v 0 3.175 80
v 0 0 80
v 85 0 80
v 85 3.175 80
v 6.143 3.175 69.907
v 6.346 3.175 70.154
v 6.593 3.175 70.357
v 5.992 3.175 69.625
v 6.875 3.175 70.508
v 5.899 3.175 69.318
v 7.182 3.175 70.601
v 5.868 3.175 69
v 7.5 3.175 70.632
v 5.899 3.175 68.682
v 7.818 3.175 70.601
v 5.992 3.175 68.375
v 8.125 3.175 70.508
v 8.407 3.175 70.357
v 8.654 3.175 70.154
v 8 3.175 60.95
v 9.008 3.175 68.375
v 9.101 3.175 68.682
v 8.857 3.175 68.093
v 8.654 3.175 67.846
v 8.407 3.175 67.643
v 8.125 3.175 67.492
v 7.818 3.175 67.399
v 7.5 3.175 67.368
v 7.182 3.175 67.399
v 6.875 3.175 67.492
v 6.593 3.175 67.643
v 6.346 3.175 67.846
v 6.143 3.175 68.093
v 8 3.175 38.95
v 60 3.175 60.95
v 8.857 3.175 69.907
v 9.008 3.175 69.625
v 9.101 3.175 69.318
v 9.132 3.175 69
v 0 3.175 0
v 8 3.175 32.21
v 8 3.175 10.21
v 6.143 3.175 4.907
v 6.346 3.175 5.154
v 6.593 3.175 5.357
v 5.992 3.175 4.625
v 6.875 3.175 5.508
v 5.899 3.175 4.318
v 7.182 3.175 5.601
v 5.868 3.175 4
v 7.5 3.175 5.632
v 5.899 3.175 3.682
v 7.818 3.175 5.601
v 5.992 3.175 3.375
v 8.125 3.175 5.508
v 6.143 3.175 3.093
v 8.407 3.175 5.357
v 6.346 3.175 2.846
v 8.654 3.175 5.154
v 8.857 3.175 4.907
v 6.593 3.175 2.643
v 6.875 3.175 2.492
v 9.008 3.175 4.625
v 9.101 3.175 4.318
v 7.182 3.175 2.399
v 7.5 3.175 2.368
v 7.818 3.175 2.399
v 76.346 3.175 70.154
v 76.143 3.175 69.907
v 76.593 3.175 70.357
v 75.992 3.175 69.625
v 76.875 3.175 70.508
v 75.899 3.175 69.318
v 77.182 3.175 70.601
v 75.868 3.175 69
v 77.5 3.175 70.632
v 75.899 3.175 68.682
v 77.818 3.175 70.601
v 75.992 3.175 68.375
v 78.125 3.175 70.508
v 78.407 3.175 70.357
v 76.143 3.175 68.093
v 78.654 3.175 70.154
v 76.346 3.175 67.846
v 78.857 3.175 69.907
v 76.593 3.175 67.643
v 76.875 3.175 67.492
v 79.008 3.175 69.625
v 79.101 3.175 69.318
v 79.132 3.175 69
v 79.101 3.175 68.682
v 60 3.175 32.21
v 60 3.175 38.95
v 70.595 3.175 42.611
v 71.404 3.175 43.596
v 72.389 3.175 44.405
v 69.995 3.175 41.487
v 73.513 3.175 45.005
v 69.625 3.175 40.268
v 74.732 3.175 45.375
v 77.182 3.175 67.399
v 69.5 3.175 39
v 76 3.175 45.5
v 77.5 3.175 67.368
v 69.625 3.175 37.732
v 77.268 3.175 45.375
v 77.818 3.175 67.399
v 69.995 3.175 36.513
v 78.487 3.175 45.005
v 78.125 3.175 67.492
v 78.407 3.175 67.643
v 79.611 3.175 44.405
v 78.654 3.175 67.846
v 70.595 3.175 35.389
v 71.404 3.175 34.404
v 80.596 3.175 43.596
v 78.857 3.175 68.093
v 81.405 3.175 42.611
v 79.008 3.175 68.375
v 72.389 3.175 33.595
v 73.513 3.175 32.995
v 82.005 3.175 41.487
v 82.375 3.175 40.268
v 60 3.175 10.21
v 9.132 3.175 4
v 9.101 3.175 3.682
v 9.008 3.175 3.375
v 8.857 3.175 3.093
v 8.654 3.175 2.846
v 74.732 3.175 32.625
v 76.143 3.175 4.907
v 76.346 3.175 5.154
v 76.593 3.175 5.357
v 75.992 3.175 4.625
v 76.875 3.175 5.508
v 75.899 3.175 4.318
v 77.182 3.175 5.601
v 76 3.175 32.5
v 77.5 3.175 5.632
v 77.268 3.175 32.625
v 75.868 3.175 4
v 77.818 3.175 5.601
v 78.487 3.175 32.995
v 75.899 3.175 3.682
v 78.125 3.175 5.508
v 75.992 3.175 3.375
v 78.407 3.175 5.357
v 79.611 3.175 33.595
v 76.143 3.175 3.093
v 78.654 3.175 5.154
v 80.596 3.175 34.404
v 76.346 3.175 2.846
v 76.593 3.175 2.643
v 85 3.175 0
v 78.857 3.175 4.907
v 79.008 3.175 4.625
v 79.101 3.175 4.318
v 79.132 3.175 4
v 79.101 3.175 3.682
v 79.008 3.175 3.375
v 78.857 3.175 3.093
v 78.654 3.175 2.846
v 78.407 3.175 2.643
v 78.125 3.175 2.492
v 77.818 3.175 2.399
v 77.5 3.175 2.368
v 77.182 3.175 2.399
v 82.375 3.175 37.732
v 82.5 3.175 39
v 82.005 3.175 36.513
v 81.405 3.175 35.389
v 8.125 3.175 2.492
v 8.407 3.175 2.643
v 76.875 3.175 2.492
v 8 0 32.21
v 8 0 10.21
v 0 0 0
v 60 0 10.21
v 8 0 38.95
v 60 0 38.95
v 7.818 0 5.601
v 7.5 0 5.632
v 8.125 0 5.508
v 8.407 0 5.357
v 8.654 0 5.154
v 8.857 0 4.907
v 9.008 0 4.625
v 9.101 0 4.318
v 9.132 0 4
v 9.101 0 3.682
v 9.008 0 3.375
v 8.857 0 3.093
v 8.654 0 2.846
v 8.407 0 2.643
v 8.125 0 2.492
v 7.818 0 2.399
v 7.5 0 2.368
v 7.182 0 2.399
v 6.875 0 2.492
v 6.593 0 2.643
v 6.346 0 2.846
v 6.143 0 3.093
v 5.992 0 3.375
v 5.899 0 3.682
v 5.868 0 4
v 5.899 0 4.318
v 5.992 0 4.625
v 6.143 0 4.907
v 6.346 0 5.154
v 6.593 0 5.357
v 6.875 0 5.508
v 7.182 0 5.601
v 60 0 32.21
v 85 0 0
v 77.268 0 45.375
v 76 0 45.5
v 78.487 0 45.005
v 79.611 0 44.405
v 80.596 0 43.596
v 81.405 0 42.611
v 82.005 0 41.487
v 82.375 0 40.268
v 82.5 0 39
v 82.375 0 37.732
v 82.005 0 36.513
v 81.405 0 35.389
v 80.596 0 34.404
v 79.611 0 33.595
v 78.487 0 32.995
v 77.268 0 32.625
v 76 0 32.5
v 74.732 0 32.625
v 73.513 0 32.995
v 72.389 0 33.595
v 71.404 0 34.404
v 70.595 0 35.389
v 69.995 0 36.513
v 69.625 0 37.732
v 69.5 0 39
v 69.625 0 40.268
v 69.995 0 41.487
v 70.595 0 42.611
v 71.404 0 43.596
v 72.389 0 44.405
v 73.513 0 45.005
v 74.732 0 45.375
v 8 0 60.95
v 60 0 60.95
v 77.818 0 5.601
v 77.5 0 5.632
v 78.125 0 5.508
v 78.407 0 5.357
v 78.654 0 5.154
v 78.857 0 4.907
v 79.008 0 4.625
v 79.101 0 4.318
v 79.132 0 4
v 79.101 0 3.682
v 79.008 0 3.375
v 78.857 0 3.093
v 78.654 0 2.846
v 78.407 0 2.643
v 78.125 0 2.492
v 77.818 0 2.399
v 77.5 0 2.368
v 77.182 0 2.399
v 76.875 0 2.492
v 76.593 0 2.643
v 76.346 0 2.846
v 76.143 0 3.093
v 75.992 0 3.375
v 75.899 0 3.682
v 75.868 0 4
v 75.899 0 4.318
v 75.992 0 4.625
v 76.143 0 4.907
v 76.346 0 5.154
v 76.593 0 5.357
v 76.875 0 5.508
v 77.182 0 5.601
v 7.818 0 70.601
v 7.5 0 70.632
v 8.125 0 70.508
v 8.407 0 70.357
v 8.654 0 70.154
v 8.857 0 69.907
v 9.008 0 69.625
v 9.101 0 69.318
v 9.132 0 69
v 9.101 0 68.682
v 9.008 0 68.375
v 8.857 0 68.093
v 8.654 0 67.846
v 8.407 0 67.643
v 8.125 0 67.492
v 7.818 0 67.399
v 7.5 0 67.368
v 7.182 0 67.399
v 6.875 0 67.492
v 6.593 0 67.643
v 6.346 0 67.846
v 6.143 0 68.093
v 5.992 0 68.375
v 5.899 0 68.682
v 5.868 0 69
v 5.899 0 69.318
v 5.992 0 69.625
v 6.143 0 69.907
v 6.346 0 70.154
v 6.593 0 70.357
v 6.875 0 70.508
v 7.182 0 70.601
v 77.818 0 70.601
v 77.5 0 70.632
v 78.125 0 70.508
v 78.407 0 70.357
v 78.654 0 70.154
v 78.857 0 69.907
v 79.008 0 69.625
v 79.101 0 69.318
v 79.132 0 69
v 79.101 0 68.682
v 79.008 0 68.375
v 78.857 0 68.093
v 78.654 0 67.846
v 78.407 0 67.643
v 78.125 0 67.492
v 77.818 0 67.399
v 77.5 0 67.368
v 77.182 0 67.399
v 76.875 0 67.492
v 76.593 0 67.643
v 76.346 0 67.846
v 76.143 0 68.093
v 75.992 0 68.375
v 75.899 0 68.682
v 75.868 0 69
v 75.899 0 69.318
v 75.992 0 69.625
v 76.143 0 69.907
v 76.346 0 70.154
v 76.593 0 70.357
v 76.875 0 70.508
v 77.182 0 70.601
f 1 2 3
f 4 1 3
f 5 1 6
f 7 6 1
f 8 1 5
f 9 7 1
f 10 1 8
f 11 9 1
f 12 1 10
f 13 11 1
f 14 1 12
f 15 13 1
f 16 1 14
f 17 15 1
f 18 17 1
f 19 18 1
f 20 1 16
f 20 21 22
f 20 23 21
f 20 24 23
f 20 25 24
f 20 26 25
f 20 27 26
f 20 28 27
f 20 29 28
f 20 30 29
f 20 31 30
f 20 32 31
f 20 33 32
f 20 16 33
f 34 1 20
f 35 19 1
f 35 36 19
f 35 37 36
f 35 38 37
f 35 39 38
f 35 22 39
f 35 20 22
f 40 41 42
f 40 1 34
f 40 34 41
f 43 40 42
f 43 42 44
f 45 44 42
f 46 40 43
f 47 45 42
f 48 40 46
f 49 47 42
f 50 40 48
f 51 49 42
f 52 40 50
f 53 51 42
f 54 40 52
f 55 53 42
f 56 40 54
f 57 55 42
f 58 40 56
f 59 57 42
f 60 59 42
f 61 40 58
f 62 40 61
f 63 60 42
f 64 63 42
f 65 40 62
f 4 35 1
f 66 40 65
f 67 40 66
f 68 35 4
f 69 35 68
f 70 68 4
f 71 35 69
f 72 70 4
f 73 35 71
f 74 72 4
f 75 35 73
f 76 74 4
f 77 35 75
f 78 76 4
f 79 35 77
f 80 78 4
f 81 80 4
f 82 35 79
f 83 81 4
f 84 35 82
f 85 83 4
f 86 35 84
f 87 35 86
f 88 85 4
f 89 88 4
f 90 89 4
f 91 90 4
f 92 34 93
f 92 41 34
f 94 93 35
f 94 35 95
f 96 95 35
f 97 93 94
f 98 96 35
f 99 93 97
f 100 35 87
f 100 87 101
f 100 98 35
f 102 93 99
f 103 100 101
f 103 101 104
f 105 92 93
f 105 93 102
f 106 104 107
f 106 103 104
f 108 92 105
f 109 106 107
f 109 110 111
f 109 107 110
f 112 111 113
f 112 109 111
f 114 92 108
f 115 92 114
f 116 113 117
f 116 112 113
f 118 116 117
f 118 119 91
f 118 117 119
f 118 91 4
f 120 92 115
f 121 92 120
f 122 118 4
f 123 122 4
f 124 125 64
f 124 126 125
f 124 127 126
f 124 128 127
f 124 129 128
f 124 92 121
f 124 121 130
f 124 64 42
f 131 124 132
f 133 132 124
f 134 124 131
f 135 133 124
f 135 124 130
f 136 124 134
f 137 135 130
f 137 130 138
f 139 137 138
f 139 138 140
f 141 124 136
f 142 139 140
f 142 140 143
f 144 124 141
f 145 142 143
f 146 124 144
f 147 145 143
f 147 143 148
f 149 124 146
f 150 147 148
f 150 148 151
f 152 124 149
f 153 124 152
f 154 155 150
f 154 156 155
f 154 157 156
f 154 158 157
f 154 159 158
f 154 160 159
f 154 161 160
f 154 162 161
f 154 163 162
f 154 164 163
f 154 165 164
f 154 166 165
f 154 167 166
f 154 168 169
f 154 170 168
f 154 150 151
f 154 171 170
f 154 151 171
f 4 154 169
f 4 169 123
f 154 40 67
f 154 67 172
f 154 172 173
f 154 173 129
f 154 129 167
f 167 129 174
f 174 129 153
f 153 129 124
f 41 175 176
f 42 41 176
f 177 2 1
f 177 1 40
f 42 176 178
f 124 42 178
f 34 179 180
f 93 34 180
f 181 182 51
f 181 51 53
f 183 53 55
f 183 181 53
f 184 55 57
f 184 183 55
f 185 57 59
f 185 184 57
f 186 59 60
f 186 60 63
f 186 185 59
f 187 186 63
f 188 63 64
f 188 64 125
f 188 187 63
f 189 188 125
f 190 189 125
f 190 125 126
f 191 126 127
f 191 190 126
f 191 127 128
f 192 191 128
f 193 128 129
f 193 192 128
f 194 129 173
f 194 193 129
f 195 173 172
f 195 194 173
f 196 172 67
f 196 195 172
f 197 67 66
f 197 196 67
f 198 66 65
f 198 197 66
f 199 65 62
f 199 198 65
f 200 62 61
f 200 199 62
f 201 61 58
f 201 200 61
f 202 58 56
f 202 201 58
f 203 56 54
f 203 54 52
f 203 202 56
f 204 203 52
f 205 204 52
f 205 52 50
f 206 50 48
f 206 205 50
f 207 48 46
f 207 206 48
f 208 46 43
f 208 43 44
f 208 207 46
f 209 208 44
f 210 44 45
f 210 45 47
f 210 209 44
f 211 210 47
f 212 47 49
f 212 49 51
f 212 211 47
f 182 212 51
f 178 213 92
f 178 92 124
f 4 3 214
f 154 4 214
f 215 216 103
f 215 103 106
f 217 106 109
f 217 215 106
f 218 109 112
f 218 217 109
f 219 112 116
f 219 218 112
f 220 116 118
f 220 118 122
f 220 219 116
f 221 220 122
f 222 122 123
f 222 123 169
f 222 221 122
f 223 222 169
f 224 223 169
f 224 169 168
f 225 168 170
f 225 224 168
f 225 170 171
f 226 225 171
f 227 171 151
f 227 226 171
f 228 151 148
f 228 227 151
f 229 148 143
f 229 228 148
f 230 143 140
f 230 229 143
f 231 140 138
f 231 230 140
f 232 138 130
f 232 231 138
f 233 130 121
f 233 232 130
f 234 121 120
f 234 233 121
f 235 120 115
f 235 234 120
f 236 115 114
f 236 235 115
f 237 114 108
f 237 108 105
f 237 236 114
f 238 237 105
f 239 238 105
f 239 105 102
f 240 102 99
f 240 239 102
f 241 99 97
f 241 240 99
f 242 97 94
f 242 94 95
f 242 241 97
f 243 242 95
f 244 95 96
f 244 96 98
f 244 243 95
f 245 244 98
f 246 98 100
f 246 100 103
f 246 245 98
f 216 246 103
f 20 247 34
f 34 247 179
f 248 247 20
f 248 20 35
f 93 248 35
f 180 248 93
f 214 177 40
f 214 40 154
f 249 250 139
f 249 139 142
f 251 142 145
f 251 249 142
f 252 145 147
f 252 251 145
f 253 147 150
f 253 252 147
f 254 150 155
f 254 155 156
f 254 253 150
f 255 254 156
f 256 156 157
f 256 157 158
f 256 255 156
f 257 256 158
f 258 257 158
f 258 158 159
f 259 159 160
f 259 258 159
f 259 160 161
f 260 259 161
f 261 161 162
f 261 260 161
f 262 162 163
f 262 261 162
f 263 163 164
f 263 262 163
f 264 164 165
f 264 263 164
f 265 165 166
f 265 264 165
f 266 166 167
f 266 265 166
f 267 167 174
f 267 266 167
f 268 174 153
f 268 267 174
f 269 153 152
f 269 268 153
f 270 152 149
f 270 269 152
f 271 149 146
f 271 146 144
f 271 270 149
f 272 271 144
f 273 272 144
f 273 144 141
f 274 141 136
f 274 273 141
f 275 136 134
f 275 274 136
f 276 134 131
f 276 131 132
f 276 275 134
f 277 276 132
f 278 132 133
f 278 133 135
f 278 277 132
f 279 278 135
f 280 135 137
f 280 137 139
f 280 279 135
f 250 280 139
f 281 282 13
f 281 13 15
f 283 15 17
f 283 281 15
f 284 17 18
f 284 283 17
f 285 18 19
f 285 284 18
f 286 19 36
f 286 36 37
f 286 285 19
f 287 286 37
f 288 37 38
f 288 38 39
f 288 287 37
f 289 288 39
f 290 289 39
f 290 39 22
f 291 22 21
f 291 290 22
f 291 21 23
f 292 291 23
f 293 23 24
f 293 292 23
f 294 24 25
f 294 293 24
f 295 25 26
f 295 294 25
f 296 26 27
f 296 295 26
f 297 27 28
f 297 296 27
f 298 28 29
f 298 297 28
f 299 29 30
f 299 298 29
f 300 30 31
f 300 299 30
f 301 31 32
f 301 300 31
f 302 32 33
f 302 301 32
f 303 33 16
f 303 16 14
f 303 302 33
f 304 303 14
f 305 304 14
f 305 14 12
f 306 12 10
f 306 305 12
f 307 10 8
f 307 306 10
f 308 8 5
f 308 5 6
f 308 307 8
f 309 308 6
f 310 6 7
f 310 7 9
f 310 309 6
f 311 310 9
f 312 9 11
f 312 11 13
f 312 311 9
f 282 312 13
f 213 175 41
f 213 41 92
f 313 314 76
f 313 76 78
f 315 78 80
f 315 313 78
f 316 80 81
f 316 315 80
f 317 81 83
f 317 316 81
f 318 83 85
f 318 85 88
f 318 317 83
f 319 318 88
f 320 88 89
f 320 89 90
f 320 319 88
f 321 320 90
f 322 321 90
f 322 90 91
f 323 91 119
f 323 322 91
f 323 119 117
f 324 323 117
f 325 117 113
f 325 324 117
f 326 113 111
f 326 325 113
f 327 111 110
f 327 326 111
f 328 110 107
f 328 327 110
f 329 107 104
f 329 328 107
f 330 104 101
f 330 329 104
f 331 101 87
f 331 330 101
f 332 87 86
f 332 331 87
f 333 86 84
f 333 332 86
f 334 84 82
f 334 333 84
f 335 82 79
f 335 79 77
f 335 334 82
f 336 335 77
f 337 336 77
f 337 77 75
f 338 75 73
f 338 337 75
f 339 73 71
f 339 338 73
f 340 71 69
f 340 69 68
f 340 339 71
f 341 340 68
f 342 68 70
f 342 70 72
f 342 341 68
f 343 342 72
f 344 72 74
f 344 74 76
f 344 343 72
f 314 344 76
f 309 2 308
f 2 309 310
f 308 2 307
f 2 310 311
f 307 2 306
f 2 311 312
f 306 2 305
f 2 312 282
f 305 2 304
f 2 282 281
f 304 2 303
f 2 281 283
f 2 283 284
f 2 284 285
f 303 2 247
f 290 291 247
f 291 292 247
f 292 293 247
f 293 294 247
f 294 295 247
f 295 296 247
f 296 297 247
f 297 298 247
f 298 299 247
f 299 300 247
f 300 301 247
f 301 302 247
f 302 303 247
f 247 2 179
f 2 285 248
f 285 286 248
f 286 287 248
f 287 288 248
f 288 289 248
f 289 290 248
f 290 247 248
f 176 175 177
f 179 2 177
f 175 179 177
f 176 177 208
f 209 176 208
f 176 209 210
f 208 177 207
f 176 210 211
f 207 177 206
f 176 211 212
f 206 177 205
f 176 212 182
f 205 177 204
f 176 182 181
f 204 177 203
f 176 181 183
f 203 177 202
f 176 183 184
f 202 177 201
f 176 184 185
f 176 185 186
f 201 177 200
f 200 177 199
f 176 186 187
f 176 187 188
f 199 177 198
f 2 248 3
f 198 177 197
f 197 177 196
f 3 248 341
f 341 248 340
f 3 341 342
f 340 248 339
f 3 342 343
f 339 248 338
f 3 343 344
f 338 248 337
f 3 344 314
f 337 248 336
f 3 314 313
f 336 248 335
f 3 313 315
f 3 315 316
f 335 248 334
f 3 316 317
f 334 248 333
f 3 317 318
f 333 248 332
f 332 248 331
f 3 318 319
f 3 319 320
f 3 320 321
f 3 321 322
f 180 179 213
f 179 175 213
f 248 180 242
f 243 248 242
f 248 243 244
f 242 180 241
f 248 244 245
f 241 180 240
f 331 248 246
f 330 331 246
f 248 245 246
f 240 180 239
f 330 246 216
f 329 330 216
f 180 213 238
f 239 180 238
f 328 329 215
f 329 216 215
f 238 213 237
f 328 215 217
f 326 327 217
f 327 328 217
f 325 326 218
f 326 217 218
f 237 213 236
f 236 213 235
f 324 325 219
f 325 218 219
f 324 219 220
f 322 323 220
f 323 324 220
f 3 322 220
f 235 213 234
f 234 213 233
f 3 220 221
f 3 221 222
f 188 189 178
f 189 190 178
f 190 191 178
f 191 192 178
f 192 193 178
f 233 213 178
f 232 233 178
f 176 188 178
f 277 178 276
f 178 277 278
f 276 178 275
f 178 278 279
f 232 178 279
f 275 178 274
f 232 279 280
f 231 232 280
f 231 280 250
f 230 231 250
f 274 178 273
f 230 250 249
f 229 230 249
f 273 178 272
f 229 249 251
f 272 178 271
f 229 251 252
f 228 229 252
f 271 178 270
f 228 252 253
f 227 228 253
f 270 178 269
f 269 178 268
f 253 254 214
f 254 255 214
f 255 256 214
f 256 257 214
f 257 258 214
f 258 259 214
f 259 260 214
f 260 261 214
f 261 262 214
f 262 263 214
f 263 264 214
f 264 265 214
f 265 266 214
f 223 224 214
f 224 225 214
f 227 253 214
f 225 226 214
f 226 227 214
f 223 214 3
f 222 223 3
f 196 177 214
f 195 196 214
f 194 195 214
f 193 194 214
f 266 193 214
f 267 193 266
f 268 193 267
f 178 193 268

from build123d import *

# Parameters (mm, degrees)
SKETCH1_W           = 85
SKETCH1_H           = 80
SKETCH1_R           = 1.63195
SKETCH1_R_2         = 6.5
SKETCH1_W_2         = 52
SKETCH1_H_2         = 22
BOSS_EXTRUDE1_DEPTH = 3.175


with BuildPart() as part:
    # Sketch1 → Boss-Extrude1 (new body)
    with BuildSketch(Plane(origin=(0, 0, 0), x_dir=(1, 0, 0), z_dir=(0, 1, 0))):
        with Locations((42.5, -40)):
            Rectangle(SKETCH1_W, SKETCH1_H)
        with Locations(Location((7.5, -4, 0), (0, 0, 270))):
            Circle(SKETCH1_R, mode=Mode.SUBTRACT)
        with Locations(Location((7.5, -69, 0), (0, 0, 270))):
            Circle(SKETCH1_R, mode=Mode.SUBTRACT)
        with Locations(Location((77.5, -69, 0), (0, 0, 270))):
            Circle(SKETCH1_R, mode=Mode.SUBTRACT)
        with Locations(Location((77.5, -4, 0), (0, 0, 270))):
            Circle(SKETCH1_R, mode=Mode.SUBTRACT)
        with Locations(Location((76, -39, 0), (0, 0, 270))):
            Circle(SKETCH1_R_2, mode=Mode.SUBTRACT)
        with Locations((34, -49.95)):
            Rectangle(SKETCH1_W_2, SKETCH1_H_2, mode=Mode.SUBTRACT)
        with Locations((34, -21.21)):
            Rectangle(SKETCH1_W_2, SKETCH1_H_2, mode=Mode.SUBTRACT)
    extrude(amount=BOSS_EXTRUDE1_DEPTH)


solid = part.part
